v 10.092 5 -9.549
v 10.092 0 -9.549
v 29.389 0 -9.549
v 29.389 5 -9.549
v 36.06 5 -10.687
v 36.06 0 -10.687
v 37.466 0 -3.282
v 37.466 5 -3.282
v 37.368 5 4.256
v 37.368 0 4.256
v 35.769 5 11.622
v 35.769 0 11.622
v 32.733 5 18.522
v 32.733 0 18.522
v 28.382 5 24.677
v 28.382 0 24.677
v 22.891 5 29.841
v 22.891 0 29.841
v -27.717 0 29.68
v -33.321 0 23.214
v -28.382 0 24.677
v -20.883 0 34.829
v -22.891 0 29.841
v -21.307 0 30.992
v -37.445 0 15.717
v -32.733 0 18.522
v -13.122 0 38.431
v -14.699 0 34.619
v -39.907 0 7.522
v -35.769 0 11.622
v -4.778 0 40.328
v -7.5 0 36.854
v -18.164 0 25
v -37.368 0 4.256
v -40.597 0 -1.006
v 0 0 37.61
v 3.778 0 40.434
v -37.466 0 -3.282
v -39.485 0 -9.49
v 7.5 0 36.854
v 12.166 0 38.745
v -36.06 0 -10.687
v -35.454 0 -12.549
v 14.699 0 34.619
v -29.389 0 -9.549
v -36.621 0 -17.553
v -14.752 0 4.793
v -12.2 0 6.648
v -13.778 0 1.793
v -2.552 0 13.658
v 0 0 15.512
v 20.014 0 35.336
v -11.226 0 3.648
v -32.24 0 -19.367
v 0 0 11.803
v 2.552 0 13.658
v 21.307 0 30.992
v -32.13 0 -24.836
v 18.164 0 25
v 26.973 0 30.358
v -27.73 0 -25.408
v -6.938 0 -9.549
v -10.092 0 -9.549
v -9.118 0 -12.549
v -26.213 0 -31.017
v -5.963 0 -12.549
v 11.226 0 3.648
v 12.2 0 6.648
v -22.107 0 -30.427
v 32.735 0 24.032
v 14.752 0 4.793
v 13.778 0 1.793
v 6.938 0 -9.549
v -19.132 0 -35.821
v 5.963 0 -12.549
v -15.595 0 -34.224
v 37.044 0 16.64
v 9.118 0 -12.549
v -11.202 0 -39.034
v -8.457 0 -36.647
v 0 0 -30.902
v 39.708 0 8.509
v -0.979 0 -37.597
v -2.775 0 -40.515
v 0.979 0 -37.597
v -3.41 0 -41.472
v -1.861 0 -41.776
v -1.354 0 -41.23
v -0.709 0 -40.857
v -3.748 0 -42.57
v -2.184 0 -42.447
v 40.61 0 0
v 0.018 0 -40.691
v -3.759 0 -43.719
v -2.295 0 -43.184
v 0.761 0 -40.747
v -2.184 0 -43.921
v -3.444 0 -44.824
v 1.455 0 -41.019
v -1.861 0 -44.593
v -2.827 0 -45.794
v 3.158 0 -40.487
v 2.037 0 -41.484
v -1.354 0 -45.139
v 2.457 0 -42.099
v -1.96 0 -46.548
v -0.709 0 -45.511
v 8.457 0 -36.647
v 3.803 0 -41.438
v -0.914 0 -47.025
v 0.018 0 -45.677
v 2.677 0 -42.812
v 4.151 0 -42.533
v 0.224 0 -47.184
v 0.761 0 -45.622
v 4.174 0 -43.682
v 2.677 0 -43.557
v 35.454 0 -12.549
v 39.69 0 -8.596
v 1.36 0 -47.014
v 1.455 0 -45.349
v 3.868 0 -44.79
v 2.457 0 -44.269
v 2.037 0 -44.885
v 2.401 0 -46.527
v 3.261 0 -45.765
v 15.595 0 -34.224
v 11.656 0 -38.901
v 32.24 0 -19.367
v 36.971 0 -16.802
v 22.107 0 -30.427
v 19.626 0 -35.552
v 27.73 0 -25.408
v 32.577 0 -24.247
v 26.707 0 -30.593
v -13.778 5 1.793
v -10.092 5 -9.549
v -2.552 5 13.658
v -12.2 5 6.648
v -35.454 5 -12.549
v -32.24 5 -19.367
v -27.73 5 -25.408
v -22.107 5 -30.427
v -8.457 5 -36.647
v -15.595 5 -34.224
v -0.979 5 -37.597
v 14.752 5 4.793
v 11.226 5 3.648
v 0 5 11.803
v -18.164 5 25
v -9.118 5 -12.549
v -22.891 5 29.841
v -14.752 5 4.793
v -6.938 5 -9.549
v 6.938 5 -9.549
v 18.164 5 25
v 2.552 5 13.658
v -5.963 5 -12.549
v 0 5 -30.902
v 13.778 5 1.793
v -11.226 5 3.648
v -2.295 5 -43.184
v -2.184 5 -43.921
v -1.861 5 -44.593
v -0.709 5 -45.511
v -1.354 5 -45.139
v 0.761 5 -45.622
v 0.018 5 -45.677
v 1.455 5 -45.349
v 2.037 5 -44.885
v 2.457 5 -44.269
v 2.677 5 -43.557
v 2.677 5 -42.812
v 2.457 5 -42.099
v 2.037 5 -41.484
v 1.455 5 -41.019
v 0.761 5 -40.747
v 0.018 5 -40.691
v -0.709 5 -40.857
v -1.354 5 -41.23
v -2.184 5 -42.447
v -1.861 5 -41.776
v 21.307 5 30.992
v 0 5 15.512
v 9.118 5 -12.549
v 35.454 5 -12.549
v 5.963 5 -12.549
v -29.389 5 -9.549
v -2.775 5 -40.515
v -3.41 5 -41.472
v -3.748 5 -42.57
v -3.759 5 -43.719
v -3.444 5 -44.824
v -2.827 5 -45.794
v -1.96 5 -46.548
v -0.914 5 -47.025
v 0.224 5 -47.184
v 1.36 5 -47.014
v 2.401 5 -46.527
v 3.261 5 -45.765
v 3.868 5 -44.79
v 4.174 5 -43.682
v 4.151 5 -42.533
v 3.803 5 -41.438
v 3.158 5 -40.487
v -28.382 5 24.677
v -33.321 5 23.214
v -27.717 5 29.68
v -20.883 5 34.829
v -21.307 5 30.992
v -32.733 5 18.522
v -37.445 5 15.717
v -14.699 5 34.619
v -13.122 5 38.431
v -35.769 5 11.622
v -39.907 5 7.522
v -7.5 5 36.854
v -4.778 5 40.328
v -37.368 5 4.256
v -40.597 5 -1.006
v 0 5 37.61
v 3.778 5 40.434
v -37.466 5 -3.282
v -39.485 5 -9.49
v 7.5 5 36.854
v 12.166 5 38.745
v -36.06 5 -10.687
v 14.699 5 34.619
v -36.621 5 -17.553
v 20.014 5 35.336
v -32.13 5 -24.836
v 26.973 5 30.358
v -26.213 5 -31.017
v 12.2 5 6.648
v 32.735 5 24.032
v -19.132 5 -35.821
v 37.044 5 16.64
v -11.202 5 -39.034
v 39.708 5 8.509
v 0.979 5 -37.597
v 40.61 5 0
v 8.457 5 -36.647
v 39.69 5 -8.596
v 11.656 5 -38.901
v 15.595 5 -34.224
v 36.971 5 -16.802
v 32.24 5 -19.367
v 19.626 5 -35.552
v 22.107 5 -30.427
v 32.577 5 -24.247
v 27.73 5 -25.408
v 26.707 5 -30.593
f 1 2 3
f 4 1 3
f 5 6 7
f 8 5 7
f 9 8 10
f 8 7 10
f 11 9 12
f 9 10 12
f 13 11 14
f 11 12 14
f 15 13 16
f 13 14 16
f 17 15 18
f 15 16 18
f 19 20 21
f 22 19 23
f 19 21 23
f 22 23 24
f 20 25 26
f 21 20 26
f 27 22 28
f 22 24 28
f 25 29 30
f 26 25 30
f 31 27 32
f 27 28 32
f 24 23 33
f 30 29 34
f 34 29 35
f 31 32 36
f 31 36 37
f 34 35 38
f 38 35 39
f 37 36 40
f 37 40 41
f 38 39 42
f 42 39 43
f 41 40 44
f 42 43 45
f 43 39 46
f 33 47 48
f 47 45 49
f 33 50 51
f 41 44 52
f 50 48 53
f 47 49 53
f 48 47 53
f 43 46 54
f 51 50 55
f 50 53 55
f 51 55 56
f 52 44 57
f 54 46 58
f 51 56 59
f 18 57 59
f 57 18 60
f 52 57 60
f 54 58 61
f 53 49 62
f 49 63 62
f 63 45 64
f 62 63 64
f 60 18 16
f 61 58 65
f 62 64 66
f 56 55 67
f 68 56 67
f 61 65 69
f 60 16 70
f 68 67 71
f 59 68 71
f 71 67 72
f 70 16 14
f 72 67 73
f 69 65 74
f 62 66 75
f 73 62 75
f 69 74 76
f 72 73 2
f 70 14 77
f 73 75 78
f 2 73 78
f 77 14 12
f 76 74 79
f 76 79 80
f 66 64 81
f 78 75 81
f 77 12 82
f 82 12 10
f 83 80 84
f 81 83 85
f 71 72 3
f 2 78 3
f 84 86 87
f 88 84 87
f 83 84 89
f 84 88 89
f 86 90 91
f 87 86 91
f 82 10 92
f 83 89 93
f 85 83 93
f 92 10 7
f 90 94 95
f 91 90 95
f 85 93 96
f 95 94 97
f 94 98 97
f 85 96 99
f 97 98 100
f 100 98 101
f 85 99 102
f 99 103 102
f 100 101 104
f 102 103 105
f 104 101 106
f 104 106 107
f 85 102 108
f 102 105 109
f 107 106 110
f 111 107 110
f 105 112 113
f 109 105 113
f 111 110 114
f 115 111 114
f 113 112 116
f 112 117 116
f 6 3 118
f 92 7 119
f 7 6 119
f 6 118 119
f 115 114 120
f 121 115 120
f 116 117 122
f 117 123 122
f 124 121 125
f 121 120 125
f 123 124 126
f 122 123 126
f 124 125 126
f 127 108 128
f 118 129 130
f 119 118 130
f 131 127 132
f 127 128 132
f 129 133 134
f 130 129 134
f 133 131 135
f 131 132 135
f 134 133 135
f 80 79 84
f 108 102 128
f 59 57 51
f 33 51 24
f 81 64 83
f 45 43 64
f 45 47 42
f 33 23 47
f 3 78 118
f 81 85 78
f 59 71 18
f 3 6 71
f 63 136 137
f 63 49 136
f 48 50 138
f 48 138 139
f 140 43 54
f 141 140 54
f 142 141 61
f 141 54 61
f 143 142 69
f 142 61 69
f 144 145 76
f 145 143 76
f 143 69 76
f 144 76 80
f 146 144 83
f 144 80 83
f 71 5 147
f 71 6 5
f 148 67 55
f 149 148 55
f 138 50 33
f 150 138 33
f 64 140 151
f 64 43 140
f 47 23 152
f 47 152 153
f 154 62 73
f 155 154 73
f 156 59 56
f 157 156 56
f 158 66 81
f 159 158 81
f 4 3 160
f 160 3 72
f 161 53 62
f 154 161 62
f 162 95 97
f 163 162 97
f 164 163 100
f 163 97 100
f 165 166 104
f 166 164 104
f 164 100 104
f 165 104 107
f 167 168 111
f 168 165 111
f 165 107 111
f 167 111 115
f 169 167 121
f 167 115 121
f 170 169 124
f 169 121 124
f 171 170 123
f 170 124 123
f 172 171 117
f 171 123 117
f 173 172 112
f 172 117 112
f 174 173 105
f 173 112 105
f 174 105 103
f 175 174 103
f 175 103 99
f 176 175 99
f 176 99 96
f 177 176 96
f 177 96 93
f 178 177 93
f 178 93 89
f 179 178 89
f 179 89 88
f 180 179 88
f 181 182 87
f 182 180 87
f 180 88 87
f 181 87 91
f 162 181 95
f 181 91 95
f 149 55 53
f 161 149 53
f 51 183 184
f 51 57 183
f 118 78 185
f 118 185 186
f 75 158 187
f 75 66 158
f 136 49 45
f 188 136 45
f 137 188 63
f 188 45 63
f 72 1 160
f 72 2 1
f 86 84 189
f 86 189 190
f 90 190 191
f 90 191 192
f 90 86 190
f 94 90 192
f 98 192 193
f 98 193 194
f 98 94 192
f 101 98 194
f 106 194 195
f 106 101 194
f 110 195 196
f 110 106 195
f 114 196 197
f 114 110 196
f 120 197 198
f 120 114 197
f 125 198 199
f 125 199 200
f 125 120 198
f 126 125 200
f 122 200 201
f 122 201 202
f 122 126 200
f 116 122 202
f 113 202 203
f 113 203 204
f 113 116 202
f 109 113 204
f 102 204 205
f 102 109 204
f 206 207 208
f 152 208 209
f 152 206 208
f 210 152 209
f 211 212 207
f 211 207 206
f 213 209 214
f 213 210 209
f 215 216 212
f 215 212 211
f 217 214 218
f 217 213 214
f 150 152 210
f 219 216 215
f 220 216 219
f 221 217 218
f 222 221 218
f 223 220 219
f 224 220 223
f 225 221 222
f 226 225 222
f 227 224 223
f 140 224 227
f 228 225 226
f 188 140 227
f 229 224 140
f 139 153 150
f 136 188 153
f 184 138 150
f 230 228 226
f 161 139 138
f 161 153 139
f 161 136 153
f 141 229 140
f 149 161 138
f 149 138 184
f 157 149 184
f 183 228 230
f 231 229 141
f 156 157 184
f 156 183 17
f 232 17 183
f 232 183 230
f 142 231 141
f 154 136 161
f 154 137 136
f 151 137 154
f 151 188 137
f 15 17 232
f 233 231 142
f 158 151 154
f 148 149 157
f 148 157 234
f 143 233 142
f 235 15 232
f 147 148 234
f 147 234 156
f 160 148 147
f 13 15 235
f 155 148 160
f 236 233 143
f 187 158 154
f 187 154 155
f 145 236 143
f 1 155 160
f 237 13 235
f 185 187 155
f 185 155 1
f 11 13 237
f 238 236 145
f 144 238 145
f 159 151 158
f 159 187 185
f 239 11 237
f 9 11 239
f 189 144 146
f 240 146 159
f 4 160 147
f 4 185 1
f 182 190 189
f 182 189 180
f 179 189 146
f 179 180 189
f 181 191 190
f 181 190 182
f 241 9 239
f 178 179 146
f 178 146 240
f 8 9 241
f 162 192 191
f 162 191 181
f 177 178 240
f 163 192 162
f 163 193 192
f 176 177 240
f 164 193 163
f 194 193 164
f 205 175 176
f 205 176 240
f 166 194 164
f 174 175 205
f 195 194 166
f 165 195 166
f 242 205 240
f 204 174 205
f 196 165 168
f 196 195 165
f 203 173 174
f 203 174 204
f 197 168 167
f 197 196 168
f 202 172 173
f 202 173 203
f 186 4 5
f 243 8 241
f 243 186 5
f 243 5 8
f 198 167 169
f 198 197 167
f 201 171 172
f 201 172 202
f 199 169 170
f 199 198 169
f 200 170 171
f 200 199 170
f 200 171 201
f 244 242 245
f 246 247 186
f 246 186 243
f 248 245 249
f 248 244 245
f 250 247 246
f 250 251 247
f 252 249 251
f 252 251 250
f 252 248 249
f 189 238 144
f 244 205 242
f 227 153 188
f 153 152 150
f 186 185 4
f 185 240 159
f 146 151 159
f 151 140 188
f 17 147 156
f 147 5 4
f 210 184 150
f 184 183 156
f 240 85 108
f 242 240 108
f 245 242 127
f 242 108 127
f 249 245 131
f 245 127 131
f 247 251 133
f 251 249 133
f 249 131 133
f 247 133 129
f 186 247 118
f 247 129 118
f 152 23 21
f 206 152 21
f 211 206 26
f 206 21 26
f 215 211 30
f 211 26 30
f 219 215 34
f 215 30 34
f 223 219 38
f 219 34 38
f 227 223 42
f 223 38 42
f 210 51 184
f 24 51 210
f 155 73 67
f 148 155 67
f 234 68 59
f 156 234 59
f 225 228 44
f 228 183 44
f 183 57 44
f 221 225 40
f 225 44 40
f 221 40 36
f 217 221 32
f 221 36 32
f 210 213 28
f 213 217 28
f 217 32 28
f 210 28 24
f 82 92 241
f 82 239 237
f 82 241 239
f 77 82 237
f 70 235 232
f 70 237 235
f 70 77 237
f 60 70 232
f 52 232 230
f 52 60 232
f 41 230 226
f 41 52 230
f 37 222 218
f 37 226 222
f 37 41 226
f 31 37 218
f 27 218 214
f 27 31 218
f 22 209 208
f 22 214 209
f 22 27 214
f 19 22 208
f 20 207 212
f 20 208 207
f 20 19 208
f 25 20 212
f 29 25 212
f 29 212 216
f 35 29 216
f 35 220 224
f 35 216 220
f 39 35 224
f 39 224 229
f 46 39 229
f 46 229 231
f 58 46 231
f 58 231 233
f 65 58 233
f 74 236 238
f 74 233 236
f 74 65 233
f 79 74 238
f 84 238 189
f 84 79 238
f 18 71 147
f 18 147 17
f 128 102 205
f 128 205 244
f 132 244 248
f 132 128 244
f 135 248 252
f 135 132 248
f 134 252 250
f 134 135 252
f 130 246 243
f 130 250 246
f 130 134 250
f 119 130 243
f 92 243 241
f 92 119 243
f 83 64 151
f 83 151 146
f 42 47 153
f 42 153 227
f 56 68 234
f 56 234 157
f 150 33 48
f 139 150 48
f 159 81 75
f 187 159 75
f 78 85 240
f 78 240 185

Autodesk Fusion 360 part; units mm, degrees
sketch "草图1" plane through (0, 0, 0) normal (0, 1, 0) x (1, 0, 0)
  line L0 (-14.7524, -4.7933) -> (-36.0595, 10.6872)
  circle A0 centre (0, 0) radius 40.6099
  line L1 (-5.9631, 12.5492) -> (0, 30.9017)
  line L2 (-9.1175, 12.5492) -> (-0.9789, 37.5972)
  line L3 (-35.4545, 12.5492) -> (-9.1175, 12.5492)
  line L4 (-29.3893, 9.5492) -> (-10.0923, 9.5492)
  line L5 (-13.7777, -1.7933) -> (-29.3893, 9.5492)
  line L6 (-18.1636, -25) -> (-12.2005, -6.6475)
  line L7 (-11.2257, -3.6475) -> (-6.9379, 9.5492)
  line L8 (-22.891, -29.8414) -> (-14.7524, -4.7933)
  line L9 (-13.7777, -1.7933) -> (-10.0923, 9.5492)
  line L10 (29.3893, 9.5492) -> (13.7777, -1.7933)
  line L11 (36.0595, 10.6872) -> (14.7524, -4.7933)
  line L12 (12.2005, -6.6475) -> (2.552, -13.6575)
  line L13 (0, -15.5116) -> (-21.3071, -30.9921)
  line L14 (18.1636, -25) -> (2.552, -13.6575)
  line L15 (0, -11.8034) -> (-11.2257, -3.6475)
  line L16 (21.3071, -30.9921) -> (0, -15.5116)
  line L17 (-2.552, -13.6575) -> (-12.2005, -6.6475)
  line L18 (11.2257, -3.6475) -> (0, -11.8034)
  line L19 (-2.552, -13.6575) -> (-18.1636, -25)
  line L20 (14.7524, -4.7933) -> (22.891, -29.8414)
  line L21 (0.9789, 37.5972) -> (9.1175, 12.5492)
  line L22 (10.0923, 9.5492) -> (13.7777, -1.7933)
  line L23 (0, 30.9017) -> (5.9631, 12.5492)
  line L24 (-6.9379, 9.5492) -> (6.9379, 9.5492)
  line L25 (10.0923, 9.5492) -> (29.3893, 9.5492)
  line L26 (-5.9631, 12.5492) -> (5.9631, 12.5492)
  line L27 (9.1175, 12.5492) -> (35.4545, 12.5492)
  line L28 (6.9379, 9.5492) -> (11.2257, -3.6475)
  line L29 (12.2005, -6.6475) -> (18.1636, -25)
  arc A1 (-0.9789, 37.5972) -> (-35.4545, 12.5492) centre (0, 0) ccw
  arc A2 (35.4545, 12.5492) -> (0.9789, 37.5972) centre (0, 0) ccw
  arc A3 (22.891, -29.8414) -> (36.0595, 10.6872) centre (0, 0) ccw
  arc A4 (-36.0595, 10.6872) -> (-22.891, -29.8414) centre (0, 0) ccw
  arc A5 (-21.3071, -30.9921) -> (21.3071, -30.9921) centre (0, 0) ccw
extrude "拉伸1" add sketch "草图1" along normal blind 5 makes body 1
sketch "草图2" plane through (0, 5, 0) normal (0, 1, 0) x (-1, 0, 0)
  arc A0 (21.3071, 30.9921) -> (-21.3071, 30.9921) centre (0, 0) ccw
  line L0 (21.3071, 30.9921) -> (0, 15.5116)
  line L1 (0, 15.5116) -> (-21.3071, 30.9921)
  arc A1 (-22.891, 29.8414) -> (-36.0595, -10.6872) centre (0, 0) ccw
  line L2 (-22.891, 29.8414) -> (-14.7524, 4.7933)
  line L3 (-14.7524, 4.7933) -> (-36.0595, -10.6872)
  arc A2 (-35.4545, -12.5492) -> (-0.9789, -37.5972) centre (0, 0) ccw
  line L4 (-35.4545, -12.5492) -> (-9.1175, -12.5492)
  line L5 (-9.1175, -12.5492) -> (-0.9789, -37.5972)
  arc A3 (36.0595, -10.6872) -> (22.891, 29.8414) centre (0, 0) ccw
  line L6 (36.0595, -10.6872) -> (14.7524, 4.7933)
  line L7 (14.7524, 4.7933) -> (22.891, 29.8414)
  line L8 (6.9379, -9.5492) -> (-6.9379, -9.5492)
  line L9 (-6.9379, -9.5492) -> (-11.2257, 3.6475)
  line L10 (-11.2257, 3.6475) -> (0, 11.8034)
  line L11 (0, 11.8034) -> (11.2257, 3.6475)
  line L12 (11.2257, 3.6475) -> (6.9379, -9.5492)
  line L13 (-2.552, 13.6575) -> (-12.2005, 6.6475)
  line L14 (-12.2005, 6.6475) -> (-18.1636, 25)
  line L15 (-18.1636, 25) -> (-2.552, 13.6575)
  arc A4 (0.9789, -37.5972) -> (35.4545, -12.5492) centre (0, 0) ccw
  line L16 (0.9789, -37.5972) -> (9.1175, -12.5492)
  line L17 (9.1175, -12.5492) -> (35.4545, -12.5492)
  line L18 (5.9631, -12.5492) -> (0, -30.9017)
  line L19 (0, -30.9017) -> (-5.9631, -12.5492)
  line L20 (-5.9631, -12.5492) -> (5.9631, -12.5492)
  line L21 (-13.7777, 1.7933) -> (-10.0923, -9.5492)
  line L22 (-10.0923, -9.5492) -> (-29.3893, -9.5492)
  line L23 (-29.3893, -9.5492) -> (-13.7777, 1.7933)
  line L24 (12.2005, 6.6475) -> (2.552, 13.6575)
  line L25 (2.552, 13.6575) -> (18.1636, 25)
  line L26 (18.1636, 25) -> (12.2005, 6.6475)
  line L27 (13.7777, 1.7933) -> (29.3893, -9.5492)
  line L28 (29.3893, -9.5492) -> (10.0923, -9.5492)
  line L29 (10.0923, -9.5492) -> (13.7777, 1.7933)
  circle A5 centre (0, 0) radius 40.6099
  circle A6 centre (55, 0) radius 2.5
  circle A7 centre (55, 0) radius 4
  dimension "d5" = 8
extrude "拉伸2" add sketch "草图2" along normal blind 5 separate body contours A7 makes body 2
move_body "移动1" bodies 2 to x (1, 0, 0) y (0, 1, 0) z (0, 0, 1) at (0, -5, 0)
move_body "移动2" bodies 2 to x (1, 0, 0) y (0, 1, 0) z (0, 0, 1) at (55.2046, 0, -43.1842)
combine "合并1" operation add target body 1 tool bodies 2
